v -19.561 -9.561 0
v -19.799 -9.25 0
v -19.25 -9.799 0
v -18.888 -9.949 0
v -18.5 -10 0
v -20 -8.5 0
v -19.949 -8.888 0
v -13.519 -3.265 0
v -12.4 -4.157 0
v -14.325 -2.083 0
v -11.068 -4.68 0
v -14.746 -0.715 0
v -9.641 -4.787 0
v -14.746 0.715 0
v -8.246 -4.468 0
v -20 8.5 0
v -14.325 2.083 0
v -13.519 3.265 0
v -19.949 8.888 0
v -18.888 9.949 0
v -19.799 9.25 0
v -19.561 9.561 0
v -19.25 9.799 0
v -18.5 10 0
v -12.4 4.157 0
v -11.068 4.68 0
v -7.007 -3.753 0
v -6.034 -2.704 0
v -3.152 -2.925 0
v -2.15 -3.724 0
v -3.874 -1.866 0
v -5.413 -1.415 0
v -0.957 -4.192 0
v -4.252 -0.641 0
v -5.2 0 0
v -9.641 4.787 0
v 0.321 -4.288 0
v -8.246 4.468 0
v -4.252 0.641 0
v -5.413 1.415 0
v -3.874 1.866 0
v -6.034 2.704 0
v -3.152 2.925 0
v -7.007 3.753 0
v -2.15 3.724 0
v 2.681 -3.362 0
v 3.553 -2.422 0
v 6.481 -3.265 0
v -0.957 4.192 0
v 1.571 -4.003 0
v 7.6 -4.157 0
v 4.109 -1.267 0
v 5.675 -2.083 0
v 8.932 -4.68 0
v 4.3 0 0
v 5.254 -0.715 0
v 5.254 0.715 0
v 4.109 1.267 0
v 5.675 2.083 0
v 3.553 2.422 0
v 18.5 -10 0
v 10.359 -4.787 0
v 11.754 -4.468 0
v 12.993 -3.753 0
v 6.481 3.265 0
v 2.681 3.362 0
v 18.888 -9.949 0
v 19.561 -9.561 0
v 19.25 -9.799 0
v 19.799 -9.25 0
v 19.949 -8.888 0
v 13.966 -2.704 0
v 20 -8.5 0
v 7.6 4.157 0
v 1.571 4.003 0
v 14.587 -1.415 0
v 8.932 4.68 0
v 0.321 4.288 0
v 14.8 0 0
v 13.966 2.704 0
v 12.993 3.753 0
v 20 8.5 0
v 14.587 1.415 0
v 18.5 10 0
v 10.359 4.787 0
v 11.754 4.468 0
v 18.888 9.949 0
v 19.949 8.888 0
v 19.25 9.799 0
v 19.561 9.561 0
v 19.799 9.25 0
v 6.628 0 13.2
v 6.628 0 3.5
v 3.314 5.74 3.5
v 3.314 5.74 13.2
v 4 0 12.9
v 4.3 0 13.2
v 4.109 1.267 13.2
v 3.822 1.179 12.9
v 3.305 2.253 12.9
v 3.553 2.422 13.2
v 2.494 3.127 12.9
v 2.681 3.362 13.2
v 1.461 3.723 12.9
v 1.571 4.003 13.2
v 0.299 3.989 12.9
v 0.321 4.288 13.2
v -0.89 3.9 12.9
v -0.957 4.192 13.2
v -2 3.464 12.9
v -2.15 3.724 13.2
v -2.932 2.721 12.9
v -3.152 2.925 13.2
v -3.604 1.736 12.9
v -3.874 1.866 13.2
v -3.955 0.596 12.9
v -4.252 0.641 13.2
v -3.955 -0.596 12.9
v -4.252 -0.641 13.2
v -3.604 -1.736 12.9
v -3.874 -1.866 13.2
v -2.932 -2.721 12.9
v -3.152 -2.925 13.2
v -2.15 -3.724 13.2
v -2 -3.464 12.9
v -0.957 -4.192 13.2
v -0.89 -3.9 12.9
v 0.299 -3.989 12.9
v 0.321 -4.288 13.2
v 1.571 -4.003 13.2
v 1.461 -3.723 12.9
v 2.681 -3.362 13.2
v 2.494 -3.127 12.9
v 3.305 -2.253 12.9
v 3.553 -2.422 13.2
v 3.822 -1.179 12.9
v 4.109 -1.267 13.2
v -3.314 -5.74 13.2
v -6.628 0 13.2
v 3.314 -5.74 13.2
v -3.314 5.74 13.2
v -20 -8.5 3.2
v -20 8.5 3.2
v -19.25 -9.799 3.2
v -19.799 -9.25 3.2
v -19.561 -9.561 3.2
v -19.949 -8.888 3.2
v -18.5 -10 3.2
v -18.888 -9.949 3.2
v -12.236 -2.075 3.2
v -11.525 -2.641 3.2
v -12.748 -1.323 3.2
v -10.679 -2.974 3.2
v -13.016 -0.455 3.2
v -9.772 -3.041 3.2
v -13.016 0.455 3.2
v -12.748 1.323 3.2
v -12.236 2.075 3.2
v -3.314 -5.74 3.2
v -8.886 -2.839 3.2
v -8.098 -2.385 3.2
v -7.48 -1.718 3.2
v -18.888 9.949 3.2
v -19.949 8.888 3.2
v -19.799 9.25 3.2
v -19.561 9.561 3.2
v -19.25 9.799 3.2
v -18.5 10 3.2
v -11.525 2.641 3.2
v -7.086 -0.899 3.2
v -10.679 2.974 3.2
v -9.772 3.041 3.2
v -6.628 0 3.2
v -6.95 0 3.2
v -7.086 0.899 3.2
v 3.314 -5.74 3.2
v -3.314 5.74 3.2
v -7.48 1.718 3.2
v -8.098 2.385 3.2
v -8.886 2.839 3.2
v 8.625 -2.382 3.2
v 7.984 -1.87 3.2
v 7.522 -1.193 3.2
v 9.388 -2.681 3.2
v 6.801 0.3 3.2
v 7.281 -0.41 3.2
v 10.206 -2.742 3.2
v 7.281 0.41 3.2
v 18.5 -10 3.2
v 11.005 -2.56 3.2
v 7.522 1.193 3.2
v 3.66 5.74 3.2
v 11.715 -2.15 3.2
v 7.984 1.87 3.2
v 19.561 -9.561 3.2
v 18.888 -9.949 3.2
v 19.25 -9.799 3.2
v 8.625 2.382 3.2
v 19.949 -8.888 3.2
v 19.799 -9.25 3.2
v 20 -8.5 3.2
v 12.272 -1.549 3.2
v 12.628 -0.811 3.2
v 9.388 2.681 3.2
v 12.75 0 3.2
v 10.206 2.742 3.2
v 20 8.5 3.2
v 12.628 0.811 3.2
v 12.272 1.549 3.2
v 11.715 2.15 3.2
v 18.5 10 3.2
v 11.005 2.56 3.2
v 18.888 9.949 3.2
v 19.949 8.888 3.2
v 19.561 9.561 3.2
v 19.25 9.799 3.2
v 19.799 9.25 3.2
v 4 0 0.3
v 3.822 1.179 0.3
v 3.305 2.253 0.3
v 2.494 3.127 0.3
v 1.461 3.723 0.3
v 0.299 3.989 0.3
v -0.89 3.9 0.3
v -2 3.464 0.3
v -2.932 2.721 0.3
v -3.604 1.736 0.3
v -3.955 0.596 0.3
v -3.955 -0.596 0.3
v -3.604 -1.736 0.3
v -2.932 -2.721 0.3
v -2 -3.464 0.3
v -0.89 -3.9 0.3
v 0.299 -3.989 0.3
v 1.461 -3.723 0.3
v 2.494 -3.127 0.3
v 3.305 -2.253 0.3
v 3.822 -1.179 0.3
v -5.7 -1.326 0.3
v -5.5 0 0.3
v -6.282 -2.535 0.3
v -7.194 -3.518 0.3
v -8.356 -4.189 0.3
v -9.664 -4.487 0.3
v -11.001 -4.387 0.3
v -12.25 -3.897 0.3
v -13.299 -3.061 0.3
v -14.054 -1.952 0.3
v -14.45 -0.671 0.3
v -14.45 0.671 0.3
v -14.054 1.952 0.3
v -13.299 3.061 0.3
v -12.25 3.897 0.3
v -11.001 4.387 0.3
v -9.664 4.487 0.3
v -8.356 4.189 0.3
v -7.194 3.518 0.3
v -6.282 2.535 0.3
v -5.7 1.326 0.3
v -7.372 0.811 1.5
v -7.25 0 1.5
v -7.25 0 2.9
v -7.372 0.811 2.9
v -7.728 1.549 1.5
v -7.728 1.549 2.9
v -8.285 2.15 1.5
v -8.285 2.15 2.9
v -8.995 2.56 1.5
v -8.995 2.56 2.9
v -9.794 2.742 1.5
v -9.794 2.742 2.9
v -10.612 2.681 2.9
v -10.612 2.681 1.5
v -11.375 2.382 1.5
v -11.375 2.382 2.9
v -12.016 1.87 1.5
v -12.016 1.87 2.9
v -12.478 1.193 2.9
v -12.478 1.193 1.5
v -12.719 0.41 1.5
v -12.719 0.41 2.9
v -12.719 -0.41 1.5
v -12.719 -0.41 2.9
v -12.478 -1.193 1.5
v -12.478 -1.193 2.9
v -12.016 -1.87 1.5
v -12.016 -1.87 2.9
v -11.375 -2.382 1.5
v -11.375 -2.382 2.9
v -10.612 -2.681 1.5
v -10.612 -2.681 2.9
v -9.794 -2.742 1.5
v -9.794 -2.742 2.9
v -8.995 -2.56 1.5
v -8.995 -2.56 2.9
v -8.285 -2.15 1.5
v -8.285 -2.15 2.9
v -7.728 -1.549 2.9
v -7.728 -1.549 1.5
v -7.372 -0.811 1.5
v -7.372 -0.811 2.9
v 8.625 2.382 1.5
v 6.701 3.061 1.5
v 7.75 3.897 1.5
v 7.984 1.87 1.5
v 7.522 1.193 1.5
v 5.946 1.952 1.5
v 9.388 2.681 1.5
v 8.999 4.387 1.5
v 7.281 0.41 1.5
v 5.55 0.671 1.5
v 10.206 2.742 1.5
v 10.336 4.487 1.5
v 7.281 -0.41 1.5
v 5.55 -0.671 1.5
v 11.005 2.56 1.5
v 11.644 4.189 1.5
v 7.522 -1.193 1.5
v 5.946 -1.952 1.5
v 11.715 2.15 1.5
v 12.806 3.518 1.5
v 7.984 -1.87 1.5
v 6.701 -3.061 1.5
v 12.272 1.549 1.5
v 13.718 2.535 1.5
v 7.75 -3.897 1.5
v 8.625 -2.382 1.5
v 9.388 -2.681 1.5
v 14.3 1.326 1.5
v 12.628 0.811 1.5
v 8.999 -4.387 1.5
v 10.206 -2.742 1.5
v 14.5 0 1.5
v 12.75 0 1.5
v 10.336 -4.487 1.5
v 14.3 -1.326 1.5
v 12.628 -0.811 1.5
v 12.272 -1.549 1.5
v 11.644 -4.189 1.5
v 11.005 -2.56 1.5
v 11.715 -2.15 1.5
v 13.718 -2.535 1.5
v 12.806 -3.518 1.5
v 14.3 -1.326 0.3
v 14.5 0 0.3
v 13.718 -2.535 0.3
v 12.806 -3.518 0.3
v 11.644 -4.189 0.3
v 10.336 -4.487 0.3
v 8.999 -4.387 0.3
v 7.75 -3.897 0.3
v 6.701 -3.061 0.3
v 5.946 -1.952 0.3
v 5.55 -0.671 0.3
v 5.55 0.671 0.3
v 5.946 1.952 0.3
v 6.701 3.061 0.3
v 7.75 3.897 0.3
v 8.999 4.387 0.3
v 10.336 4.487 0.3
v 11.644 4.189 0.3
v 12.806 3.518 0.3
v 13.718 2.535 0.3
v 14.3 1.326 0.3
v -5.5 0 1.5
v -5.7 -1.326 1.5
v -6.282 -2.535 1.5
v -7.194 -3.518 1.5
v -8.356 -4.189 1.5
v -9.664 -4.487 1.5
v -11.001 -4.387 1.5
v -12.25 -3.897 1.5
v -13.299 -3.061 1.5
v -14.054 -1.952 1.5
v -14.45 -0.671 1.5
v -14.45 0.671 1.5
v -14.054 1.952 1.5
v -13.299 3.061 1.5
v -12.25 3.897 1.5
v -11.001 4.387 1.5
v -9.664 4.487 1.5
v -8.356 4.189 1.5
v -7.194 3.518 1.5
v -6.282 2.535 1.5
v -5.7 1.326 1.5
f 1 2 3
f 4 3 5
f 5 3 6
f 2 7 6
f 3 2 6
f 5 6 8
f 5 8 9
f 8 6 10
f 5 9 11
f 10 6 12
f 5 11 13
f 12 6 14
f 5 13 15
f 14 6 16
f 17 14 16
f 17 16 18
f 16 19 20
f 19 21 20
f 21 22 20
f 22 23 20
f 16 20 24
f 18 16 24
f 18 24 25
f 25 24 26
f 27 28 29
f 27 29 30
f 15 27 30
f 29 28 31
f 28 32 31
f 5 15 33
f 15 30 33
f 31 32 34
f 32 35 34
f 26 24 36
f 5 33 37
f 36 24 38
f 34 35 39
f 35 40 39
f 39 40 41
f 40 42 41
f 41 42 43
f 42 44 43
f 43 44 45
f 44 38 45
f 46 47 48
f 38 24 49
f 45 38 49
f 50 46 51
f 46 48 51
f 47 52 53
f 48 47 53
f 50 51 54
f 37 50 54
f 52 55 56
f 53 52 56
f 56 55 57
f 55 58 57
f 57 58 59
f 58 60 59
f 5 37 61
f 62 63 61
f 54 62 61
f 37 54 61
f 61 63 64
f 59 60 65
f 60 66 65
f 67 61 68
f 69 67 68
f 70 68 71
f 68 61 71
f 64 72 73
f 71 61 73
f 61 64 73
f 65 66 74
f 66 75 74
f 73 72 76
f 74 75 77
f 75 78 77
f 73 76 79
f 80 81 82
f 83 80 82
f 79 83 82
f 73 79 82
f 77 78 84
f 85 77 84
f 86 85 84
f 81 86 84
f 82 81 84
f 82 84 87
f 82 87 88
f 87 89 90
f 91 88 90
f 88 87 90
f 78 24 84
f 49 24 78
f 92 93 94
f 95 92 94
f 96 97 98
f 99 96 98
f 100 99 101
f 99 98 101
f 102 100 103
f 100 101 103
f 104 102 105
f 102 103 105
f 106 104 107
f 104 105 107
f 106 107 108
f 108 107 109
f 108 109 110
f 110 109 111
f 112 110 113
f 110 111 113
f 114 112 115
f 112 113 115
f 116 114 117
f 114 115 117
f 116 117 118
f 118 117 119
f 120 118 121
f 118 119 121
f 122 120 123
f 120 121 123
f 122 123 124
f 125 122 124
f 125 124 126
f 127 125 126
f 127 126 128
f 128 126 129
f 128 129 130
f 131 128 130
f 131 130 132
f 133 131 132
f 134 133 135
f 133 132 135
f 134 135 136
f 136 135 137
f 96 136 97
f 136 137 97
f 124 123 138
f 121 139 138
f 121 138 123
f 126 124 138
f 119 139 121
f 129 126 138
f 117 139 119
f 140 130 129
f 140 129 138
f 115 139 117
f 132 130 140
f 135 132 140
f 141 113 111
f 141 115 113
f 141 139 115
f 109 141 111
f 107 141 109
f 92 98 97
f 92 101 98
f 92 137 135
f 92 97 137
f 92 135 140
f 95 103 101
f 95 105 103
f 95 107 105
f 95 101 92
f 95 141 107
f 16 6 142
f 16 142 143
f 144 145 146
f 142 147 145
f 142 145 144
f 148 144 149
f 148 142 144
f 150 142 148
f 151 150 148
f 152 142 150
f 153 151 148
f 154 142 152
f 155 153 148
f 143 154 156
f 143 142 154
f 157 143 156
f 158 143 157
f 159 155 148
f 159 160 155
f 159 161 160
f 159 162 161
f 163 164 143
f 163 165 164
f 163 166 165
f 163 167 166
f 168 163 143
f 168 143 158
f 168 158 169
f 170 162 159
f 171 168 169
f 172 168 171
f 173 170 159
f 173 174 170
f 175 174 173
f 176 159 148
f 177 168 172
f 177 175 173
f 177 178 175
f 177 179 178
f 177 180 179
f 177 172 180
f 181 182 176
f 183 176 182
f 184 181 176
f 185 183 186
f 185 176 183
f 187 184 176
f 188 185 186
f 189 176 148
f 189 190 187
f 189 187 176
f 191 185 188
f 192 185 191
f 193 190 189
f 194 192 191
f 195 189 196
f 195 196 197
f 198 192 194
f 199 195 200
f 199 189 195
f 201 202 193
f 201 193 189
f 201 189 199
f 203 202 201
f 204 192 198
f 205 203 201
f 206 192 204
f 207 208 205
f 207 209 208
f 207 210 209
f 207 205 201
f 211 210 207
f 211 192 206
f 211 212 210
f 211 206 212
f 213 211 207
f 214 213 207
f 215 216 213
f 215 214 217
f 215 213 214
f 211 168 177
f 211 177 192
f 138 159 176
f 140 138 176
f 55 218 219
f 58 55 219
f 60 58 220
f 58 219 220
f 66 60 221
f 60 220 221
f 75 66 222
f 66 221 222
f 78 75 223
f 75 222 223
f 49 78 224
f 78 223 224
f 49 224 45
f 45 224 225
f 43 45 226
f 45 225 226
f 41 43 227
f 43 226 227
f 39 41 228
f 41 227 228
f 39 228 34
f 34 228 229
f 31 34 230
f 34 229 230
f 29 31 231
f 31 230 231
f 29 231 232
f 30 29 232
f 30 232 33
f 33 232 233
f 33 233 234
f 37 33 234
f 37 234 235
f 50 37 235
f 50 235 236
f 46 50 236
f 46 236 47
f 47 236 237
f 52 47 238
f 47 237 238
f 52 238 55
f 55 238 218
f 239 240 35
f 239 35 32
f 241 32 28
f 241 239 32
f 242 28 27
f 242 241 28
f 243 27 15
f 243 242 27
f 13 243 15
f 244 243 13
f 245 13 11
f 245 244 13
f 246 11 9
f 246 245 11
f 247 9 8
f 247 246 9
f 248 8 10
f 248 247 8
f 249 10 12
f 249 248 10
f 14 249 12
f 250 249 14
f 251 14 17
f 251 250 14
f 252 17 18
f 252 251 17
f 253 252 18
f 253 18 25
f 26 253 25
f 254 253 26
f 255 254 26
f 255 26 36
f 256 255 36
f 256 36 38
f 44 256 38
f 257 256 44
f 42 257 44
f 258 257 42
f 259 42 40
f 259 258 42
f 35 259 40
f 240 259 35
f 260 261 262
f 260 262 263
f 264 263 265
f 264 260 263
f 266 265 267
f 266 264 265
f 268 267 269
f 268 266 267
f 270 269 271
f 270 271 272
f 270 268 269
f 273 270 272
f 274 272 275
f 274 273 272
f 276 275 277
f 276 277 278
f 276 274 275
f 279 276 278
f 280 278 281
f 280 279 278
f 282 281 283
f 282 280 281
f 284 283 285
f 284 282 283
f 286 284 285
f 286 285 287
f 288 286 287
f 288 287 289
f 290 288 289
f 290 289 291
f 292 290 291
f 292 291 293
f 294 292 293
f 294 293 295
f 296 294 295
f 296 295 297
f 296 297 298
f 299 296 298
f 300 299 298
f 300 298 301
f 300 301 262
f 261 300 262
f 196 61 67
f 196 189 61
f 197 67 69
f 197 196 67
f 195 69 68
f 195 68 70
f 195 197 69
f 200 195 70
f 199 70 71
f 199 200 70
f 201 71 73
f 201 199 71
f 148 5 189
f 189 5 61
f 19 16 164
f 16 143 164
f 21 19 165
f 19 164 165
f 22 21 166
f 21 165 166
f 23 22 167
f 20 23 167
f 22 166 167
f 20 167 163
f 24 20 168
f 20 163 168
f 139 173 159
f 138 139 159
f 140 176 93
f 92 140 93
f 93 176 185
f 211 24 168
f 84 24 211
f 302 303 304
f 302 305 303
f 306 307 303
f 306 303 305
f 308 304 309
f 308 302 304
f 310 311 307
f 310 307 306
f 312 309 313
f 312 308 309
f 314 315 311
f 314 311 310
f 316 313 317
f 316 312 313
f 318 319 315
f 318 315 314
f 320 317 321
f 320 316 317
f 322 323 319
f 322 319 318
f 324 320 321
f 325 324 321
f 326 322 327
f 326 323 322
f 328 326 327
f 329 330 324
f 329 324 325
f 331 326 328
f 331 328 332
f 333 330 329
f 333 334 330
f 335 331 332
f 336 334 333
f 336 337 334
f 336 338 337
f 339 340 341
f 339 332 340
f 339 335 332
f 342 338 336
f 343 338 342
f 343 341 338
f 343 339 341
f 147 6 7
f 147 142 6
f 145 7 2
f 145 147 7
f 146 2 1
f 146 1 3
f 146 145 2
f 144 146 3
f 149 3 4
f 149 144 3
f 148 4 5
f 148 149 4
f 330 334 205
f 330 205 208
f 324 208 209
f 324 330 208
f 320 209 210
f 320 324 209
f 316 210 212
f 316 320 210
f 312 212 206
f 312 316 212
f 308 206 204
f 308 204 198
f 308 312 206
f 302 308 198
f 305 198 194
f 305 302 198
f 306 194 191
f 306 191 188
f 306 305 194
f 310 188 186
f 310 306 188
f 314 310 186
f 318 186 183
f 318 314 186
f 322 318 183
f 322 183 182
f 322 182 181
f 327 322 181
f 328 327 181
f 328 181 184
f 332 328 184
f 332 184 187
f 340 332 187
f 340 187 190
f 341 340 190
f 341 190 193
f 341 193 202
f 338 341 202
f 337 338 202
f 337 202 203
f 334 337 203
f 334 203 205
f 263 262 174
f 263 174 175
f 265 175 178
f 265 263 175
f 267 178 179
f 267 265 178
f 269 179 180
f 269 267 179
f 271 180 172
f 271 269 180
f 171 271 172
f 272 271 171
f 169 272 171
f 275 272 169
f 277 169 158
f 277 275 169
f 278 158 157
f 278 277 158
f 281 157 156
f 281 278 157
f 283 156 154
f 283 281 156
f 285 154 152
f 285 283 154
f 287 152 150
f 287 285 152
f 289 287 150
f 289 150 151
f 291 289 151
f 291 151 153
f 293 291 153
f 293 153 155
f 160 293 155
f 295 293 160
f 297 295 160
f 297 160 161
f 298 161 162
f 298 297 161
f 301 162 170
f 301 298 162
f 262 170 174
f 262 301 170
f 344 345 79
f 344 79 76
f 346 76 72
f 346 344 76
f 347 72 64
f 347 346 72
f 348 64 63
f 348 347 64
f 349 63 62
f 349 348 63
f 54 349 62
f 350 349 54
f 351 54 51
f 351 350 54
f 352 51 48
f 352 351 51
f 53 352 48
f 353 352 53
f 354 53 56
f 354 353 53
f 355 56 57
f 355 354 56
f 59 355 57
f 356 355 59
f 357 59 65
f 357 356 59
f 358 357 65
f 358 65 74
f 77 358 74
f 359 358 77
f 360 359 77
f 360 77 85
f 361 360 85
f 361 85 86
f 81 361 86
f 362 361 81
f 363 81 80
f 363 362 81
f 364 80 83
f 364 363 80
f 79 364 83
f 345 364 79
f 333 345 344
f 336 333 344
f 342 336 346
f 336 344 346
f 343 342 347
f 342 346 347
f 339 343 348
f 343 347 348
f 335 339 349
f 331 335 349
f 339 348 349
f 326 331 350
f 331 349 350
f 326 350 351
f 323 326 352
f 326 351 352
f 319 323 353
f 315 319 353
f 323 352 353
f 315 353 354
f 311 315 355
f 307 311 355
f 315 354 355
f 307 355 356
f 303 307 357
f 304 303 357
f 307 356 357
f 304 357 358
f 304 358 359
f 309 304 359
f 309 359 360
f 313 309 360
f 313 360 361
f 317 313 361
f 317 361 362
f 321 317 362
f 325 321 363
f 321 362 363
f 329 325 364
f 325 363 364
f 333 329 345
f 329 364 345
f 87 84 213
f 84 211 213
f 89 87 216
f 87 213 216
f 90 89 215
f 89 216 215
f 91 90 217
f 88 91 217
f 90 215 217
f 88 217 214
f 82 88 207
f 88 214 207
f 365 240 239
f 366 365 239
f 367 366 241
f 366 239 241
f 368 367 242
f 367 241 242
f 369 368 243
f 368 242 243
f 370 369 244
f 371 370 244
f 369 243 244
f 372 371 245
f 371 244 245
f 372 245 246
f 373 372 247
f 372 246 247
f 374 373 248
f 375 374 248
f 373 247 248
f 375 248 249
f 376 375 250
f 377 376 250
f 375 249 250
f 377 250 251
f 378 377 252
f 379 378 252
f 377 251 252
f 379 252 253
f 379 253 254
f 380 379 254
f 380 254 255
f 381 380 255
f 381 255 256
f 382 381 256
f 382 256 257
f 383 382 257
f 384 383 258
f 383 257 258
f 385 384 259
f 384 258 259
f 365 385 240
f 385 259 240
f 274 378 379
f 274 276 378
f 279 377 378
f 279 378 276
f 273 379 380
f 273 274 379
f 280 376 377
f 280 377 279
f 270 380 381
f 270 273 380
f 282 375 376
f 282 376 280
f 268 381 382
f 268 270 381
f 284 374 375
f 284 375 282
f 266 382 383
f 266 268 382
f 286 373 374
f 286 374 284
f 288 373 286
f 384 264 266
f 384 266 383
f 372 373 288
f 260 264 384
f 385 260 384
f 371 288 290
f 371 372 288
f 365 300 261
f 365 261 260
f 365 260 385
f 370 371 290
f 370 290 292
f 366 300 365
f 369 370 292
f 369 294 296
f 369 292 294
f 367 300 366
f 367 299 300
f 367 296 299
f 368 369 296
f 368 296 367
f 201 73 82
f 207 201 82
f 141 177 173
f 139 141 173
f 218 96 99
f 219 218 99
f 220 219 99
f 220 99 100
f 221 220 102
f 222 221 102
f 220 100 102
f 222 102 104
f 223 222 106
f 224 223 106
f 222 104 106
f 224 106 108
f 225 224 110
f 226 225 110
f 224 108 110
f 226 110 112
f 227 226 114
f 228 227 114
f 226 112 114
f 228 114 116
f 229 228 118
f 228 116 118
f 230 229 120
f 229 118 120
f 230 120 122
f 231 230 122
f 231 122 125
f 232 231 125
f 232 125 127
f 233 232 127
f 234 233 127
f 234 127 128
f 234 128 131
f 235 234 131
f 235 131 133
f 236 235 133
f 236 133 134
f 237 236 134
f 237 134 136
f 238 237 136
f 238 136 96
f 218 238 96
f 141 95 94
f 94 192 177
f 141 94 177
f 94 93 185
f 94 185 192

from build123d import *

# Parameters (mm, degrees)
SKETCH_W        = 40
SKETCH_H        = 20
SKETCH_R        = 2.75
PAD_DEPTH       = 3.2
FILLET_R        = 1.5
PAD001_DEPTH    = 10
SKETCH002_R     = 4
POCKET_DEPTH    = 13.201
SKETCH003_R     = 4.5
POCKET001_DEPTH = 1.5
CHAMFER_SIZE    = 0.3
CHAMFER001_SIZE = 0.3


with BuildPart() as part:
    # Sketch → Pad (new body)
    with BuildSketch(Plane.XY):
        Rectangle(SKETCH_W, SKETCH_H)
        with Locations((10, 0)):
            Circle(SKETCH_R, mode=Mode.SUBTRACT)
        with Locations((-10, 0)):
            Circle(SKETCH_R, mode=Mode.SUBTRACT)
    extrude(amount=PAD_DEPTH)

    # Fillet
    fillet_edges = [part.edges().sort_by_distance(p)[0] for p in [
        (-20, -10, 1.6),
        (-20, 10, 1.6),
        (20, 10, 1.6),
        (20, -10, 1.6),
    ]]
    fillet(fillet_edges, radius=FILLET_R)

    # Sketch001 (on Face5 of Fillet) → Pad001 (join)
    with BuildSketch(Plane.XY.offset(3.2)):
        Polygon((6.627981, 0), (3.313991, 5.74), (-3.313991, 5.74), (-6.627981, 0), (-3.313991, -5.74), (3.313991, -5.74), align=None)
    extrude(amount=PAD001_DEPTH)

    # Sketch002 (on Face19 of Pad001) → Pocket (cut, through all)
    with BuildSketch(Plane.XY.offset(13.2)):
        Circle(SKETCH002_R)
    extrude(amount=-POCKET_DEPTH, mode=Mode.SUBTRACT)

    # Sketch003 (on Face2 of Pocket) → Pocket001 (cut)
    with BuildSketch(Plane(origin=(0, 0, 0), x_dir=(1, 0, 0), z_dir=(0, 0, -1))):
        with Locations((10, 0)):
            Circle(SKETCH003_R)
        with Locations((-10, 0)):
            Circle(SKETCH003_R)
    extrude(amount=-POCKET001_DEPTH, mode=Mode.SUBTRACT)

    # Chamfer
    chamfer_edges = [part.edges().sort_by_distance(p)[0] for p in [
        (5.5, 0, 0),
        (-4, 0, 0),
        (-14.5, 0, 0),
    ]]
    chamfer(chamfer_edges, length=CHAMFER_SIZE)

    # Chamfer001
    chamfer001_edges = [part.edges().sort_by_distance(p)[0] for p in [
        (4.970986, 2.87, 3.2),
        (-4, 0, 13.2),
        (-12.75, 0, 3.2),
    ]]
    chamfer(chamfer001_edges, length=CHAMFER001_SIZE)


solid = part.part
